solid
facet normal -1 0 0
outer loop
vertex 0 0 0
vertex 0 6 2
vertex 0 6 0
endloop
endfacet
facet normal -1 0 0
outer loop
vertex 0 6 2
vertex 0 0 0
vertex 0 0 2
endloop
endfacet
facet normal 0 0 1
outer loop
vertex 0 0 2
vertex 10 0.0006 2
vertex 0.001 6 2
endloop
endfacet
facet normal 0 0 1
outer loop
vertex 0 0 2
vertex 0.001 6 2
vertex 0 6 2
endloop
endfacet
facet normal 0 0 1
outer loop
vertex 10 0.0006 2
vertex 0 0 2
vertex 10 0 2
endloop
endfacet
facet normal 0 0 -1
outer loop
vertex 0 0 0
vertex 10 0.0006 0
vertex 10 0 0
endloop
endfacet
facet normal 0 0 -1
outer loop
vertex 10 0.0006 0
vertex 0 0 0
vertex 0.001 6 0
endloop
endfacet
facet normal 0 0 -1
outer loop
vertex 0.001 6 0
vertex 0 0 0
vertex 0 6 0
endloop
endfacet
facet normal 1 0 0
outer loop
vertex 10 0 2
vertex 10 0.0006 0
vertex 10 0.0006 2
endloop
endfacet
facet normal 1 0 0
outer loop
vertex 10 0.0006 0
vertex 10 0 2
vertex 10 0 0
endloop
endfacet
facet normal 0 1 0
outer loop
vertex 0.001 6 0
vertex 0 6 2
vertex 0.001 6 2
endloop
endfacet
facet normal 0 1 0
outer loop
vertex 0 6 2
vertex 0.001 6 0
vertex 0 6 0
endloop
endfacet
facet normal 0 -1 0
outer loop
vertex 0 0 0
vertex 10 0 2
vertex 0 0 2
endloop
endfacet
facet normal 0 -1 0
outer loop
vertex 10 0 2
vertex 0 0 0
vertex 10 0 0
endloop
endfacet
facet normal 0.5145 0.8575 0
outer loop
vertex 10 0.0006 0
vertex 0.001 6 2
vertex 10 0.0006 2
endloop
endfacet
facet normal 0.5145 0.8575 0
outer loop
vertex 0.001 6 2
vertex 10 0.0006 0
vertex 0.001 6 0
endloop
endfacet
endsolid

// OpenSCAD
// file: ../imports/Chamfer.scad
/**
  *  The MIT License (MIT)
  *
  *  "Chamfers for OpenSCAD" v0.4 Copyright (c) 2016 SebiTimeWaster
  *
  *  Permission is hereby granted, free of charge, to any person obtaining a copy
  *  of this software and associated documentation files (the "Software"), to deal
  *  in the Software without restriction, including without limitation the rights
  *  to use, copy, modify, merge, publish, distribute, sublicense, and/or sell
  *  copies of the Software, and to permit persons to whom the Software is
  *  furnished to do so, subject to the following conditions:
  *
  *  The above copyright notice and this permission notice shall be included in all
  *  copies or substantial portions of the Software.
  *
  *  THE SOFTWARE IS PROVIDED "AS IS", WITHOUT WARRANTY OF ANY KIND, EXPRESS OR
  *  IMPLIED, INCLUDING BUT NOT LIMITED TO THE WARRANTIES OF MERCHANTABILITY,
  *  FITNESS FOR A PARTICULAR PURPOSE AND NONINFRINGEMENT. IN NO EVENT SHALL THE
  *  AUTHORS OR COPYRIGHT HOLDERS BE LIABLE FOR ANY CLAIM, DAMAGES OR OTHER
  *  LIABILITY, WHETHER IN AN ACTION OF CONTRACT, TORT OR OTHERWISE, ARISING FROM,
  *  OUT OF OR IN CONNECTION WITH THE SOFTWARE OR THE USE OR OTHER DEALINGS IN THE
  *  SOFTWARE.
  */

/**
  * chamferCube returns an cube with 45° chamfers on the edges of the
  * cube. The chamfers are diectly printable on Fused deposition
  * modelling (FDM) printers without support structures.
  *
  * @param  sizeX          The size of the cube along the x axis
  * @param  sizeY          The size of the cube along the y axis
  * @param  sizeZ          The size of the cube along the z axis
  * @param  chamferHeight  The "height" of the chamfers as seen from
  *                        one of the dimensional planes (The real
  *                        width is side c in a right angled triangle)
  * @param  chamferX       Which chamfers to render along the x axis
  *                        in clockwise order starting from the zero
  *                        point, as seen from "Left view" (Ctrl + 6)
  * @param  chamferY       Which chamfers to render along the y axis
  *                        in clockwise order starting from the zero
  *                        point, as seen from "Front view" (Ctrl + 8)
  * @param  chamferZ       Which chamfers to render along the z axis
  *                        in clockwise order starting from the zero
  *                        point, as seen from "Bottom view" (Ctrl + 5)
  */
module chamferCube(sizeX, sizeY, sizeZ, chamferHeight = 1, chamferX = [1, 1, 1, 1], chamferY = [1, 1, 1, 1], chamferZ = [1, 1, 1, 1]) {
    chamferCLength = sqrt(chamferHeight * chamferHeight * 2);
    difference() {
        cube([sizeX, sizeY, sizeZ]);
        for(x = [0 : 3]) {
            chamferSide1 = min(x, 1) - floor(x / 3); // 0 1 1 0
            chamferSide2 = floor(x / 2); // 0 0 1 1
            if(chamferX[x]) {
                translate([-0.1, chamferSide1 * sizeY, -chamferHeight + chamferSide2 * sizeZ])
                rotate([45, 0, 0])
                cube([sizeX + 0.2, chamferCLength, chamferCLength]);
            }
            if(chamferY[x]) {
                translate([-chamferHeight + chamferSide2 * sizeX, -0.1, chamferSide1 * sizeZ])
                rotate([0, 45, 0])
                cube([chamferCLength, sizeY + 0.2, chamferCLength]);
            }
            if(chamferZ[x]) {
                translate([chamferSide1 * sizeX, -chamferHeight + chamferSide2 * sizeY, -0.1])
                rotate([0, 0, 45])
                cube([chamferCLength, chamferCLength, sizeZ + 0.2]);
            }
        }
    }
}

/**
  * chamferCylinder returns an cylinder or cone with 45° chamfers on
  * the edges of the cylinder. The chamfers are diectly printable on
  * Fused deposition modelling (FDM) printers without support structures.
  *
  * @param  height         Height of the cylinder
  * @param  radius         Radius of the cylinder (At the bottom)
  * @param  radius2        Radius of the cylinder (At the top)
  * @param  chamferHeight  The "height" of the chamfer at radius 1 as
  *                        seen from one of the dimensional planes (The 
  *                        real width is side c in a right angled triangle)
  * @param  chamferHeight2 The "height" of the chamfer at radius 2 as
  *                        seen from one of the dimensional planes (The 
  *                        real width is side c in a right angled triangle)
  * @param  angle          The radius of the visible part of a wedge
  *                        starting from the x axis counter-clockwise
  * @param  quality        A circle quality factor where 1.0 is a fairly
  *                        good quality, range from 0.0 to 2.0
  */
module chamferCylinder(height, radius, radius2=undef, chamferHeight = 1, chamferHeight2=undef, angle = 0, quality = -1.0) {
    radius2 = (radius2 == undef) ? radius : radius2;
    chamferHeight2 = (chamferHeight2 == undef) ? chamferHeight : chamferHeight2;
    module cc() {
        if(chamferHeight2 != 0) {
            translate([0, 0, height - abs(chamferHeight2)]) cylinder(abs(chamferHeight2), r1 = radius2, r2 = radius2 - chamferHeight2, $fn = circleSegments(radius2, quality));
        }
        translate([0, 0, abs(chamferHeight)]) cylinder(height - abs(chamferHeight2) - abs(chamferHeight), r1 = radius, r2 = radius2, $fn = circleSegments(max(radius, radius2), quality));
        if(chamferHeight2 != 0) {
            cylinder(abs(chamferHeight), r1 = radius - chamferHeight, r2 = radius, $fn = circleSegments(radius, quality));
        }
    }
    module box(brim = abs(min(chamferHeight2, 0)) + 1) {
        translate([-radius - brim, 0, -brim]) cube([radius * 2 + brim * 2, radius + brim, height + brim * 2]);
    }
    module hcc() {
        intersection() {
            cc();
            box();
        }
    }
    if(angle <= 0 || angle >= 360) cc();
    else {
        if(angle > 180) hcc();
        difference() {
            if(angle <= 180) hcc();
            else rotate([0, 0, 180]) hcc();
            rotate([0, 0, angle]) box(abs(min(chamferHeight2, 0)) + radius);
        }
    }
}

/**
  * circleSegments calculates the number of segments needed to maintain
  * a constant circle quality.
  * If a globalSegementsQuality variable exist it will overwrite the
  * standard quality setting (1.0). Order of usage is:
  * Standard (1.0) <- globalCircleQuality <- Quality parameter
  *
  * @param  r        Radius of the circle
  * @param  quality  A quality factor, where 1.0 is a fairly good
  *                  quality, range from 0.0 to 2.0
  *
  * @return  The number of segments for the circle
  */
function circleSegments(r, quality = -1.0) = (r * PI * 4 + 40) * ((quality >= 0.0) ? quality : globalCircleQuality);

// set global quality to 1.0, can be overridden by user
globalCircleQuality = 1.0;
// main file
//*******************************************************************
// Utility modules and functions
//*******************************************************************

use <../imports/Chamfer.scad>

function nnv(v, d) = v != undef ? v : d;

module tr(t, r) {
	tr = t != undef ? [t.x, t.y, t.z] : [0, 0, 0];
	ro = r != undef ? [r.x, r.y, r.z] : (t != undef && len(t) > 3) ? [t[3], t[4], t[5]] : [0, 0, 0];
	translate(tr) rotate(ro) children();
}

module rt(t, r) {
	tr = t != undef ? [-t.x, -t.y, -t.z] : [0, 0, 0];
	ro = r != undef ? [-r.x, -r.y, -r.z] : (t != undef && len(t) > 3) ? [-t[3], -t[4], -t[5]] : [0, 0, 0];
	rotate([ro.x,0,0]) rotate([0,ro.y,0]) rotate([0,0,ro.z]) translate(tr) children();
}

function setz(xy, z) = [xy.x, xy.y, z];
function setzs(xys, z) = [for (xy = xys) setz(xy, z)];

module cubex(xyyz) {
	x = xyyz[0]; y1 = xyyz[1]; y2 = xyyz[2]; z = xyyz[3];
	mirror = y1 > y2 ? [1, 0, 0] : [0, 0, 0];
	translate = y1 > y2 ? [x, 0, 0] : [0, 0, 0];
	ymin = min(y1, y2); ymax = max(y1, y2);
	translate(translate) mirror(mirror) difference() {
		cube([x, ymax, z]);
		translate([-0.001, ymin, -1]) rotate([0, 0, atan((ymax-ymin)/x)]) cube([x*2, ymax, z+2]);
	}
}

module triangle(xyz) {
	cubex([xyz.x, xyz.y, 0, xyz.z]);
}
triangle([10, 6, 2]);

module ccylinder(h, r, c1h = 0, c2h = 0, a = 360) {
	//chamferCylinder(h, r, r, chamferHeight = c1h, chamferHeight2 = c2h);
	module cc() {
		if (c1h != 0) cylinder(abs(c1h)+0.001, r-c1h, r);
		translate([0, 0, abs(c1h)]) cylinder(h-abs(c1h)-abs(c2h), r, r);
		if (c2h != 0) translate([0, 0, h-abs(c2h)-0.001]) cylinder(abs(c2h)+0.001, r, r-c2h);
	}
	if (a >= 360 || a <= 0) {
		cc();
	} else {
		difference() {
			cc();
			translate([-r-1, -r-1, -1]) cube([r+1, r*2+2, h+2]);
			rotate([0, 0, -180+min(a, 180)]) translate([-r-1, -r-1, -1]) cube([r+1, r*2+2, h+2]);
		}
		if (a > 180) difference() {
			cc();
			translate([0, -r-1, -1]) cube([r+1, r*2+2, h+2]);
			rotate([0, 0, -360+a]) translate([0, -r-1, -1]) cube([r+1, r*2+2, h+2]);
		}
	}
}

module cpieQuater(h, r, c1h = 0, c2h = 0) {
	difference() {
		cube([r, r, h]);
		translate([-0.001, -0.001, -0.001]) ccylinder(h+0.002, r, c1h = c1h, c2h = c2h);
	}
}
//cpieQuater(20,6,-1,-1);


module ccube(x, y, z, ch = 0, sides = [1, 0, 0, 0], sides2 = [0, 0, 0, 0], sides3 = [0, 0, 0, 0]) {
	chamferCube(x, y, z, ch, sides, sides2, sides3);
}

module ccubeForCut(x, y, z, ch = 0) {
	difference() {
		translate([0, -ch+0.00001, -0.1]) cube([x, y+ch+0.00001, z+0.2]);
		translate([-0.2, -y, -0.2]) ccube(x+0.4, y, z+0.4, ch+0.2, [0, 0, 1, 0]);
	}
}
//ccubeForCut(40,30,5,2);

module ccubeHalf(x, y, z, ch = 0, sides = [0, 0, 0, 0], sides2 = [0, 0, 0, 0], sides3 = [0, 0, 0, 0]) {
	difference() {
		ccube(x, y, z, ch, [sides[0], 0, 0, sides[3]], sides2, sides3);
		rotate([0, 0, atan(y/x)]) translate([0, -y, 0])
			difference() {
				translate([0, y-ch, -0.001]) cube([x*2, y*2, z+0.002]);
				translate([0, 0, -0.001]) ccube(x*2, y, z+0.002, ch, [0, sides[1], sides[2], 0]);
			};
		//translate([10,0,-1]) //rotate([0,0,atan(y/x)]) {
	}
}

//ccubeHalf(6,3,4,0.5,[0,1,1,0],[0,0,0,0],[0,0,0,0]);

/*
This design and software is copyrighted, but is free for private, non-commercial use.

All copyrights for this software belongs to Jesper Lauritsen, Denmark, smoothieAq@gmail.com.
If you are a non-profit company, or use the software for personal use, you may enjoy the software
for free under a Creative Commons (CC) Attribution-NonCommercial licence 
	https://creativecommons.org/licenses/by-nc/3.0/
Please contact Jesper, if you need any other kind of license.
*/
